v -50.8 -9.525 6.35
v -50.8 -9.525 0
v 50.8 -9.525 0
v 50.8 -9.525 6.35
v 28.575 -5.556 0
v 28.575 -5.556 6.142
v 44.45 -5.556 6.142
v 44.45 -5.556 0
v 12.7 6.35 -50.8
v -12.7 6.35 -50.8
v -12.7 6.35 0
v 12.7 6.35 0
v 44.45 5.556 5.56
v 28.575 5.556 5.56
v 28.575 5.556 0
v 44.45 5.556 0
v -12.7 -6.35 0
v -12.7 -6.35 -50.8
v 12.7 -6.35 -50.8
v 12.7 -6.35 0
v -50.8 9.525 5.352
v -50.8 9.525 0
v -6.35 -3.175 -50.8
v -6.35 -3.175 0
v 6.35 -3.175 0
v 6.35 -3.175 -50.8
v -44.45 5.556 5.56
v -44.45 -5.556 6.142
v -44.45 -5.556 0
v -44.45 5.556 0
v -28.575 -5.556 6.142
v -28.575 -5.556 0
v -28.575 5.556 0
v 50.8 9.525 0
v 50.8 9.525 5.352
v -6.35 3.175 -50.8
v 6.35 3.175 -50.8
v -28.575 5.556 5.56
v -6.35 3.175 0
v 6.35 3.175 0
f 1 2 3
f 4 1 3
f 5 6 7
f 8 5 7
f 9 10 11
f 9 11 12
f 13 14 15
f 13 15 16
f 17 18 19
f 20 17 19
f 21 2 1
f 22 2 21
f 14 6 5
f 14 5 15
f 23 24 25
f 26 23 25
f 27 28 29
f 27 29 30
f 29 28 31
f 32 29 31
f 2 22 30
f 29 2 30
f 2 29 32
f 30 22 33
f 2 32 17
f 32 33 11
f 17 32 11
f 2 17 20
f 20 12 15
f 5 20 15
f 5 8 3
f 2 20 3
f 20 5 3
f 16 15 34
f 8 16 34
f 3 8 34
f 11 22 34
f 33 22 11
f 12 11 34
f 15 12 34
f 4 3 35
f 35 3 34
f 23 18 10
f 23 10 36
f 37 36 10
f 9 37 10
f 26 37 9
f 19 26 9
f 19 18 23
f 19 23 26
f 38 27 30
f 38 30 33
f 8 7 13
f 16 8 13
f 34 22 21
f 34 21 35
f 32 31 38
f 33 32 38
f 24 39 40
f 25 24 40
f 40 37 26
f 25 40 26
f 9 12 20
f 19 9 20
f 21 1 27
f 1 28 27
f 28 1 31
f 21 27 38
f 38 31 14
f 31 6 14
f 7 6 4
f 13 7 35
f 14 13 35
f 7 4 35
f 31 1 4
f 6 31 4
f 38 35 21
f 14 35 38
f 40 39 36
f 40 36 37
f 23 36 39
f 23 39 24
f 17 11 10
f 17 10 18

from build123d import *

# Parameters (mm, degrees)
F0_W     = 101.6
F0_H     = 19.05
F1_DEPTH = 6.35
F2_W     = 15.875
F2_H     = 11.1125
F3_DEPTH = 6.35
F4_W     = 15.875
F4_H     = 11.1125
F5_DEPTH = 6.35
F7_DEPTH = 101.6
F8_W     = 25.4
F8_H     = 12.7
F8_W_2   = 12.7
F8_H_2   = 6.35
F9_DEPTH = 50.8


with BuildPart() as f1:
    # F0 (on Top) → F1 (new body)
    with BuildSketch(Plane.XY):
        Rectangle(F0_W, F0_H)
    extrude(amount=F1_DEPTH)

    # F2 (on face) → F3 (cut)
    with BuildSketch(Plane.XY.offset(6.35)):
        with Locations((-36.5125, 0)):
            Rectangle(F2_W, F2_H)
    extrude(amount=-F3_DEPTH, mode=Mode.SUBTRACT)

    # F4 (on face) → F5 (cut)
    with BuildSketch(Plane.XY.offset(6.35)):
        with Locations((36.5125, 0)):
            Rectangle(F4_W, F4_H)
    extrude(amount=-F5_DEPTH, mode=Mode.SUBTRACT)

    # F6 (on face) → F7 (cut)
    with BuildSketch(Plane.YZ.offset(50.8)):
        Polygon((9.525, 6.35), (-9.525, 6.35), (9.525, 5.351632), align=None)
    extrude(amount=-F7_DEPTH, mode=Mode.SUBTRACT)

    # F8 (on face) → F9 (join)
    with BuildSketch(Plane(origin=(0, 0, 0), x_dir=(1, 0, 0), z_dir=(0, 0, -1))):
        Rectangle(F8_W, F8_H)
        Rectangle(F8_W_2, F8_H_2, mode=Mode.SUBTRACT)
    extrude(amount=F9_DEPTH)


solid = f1.part
